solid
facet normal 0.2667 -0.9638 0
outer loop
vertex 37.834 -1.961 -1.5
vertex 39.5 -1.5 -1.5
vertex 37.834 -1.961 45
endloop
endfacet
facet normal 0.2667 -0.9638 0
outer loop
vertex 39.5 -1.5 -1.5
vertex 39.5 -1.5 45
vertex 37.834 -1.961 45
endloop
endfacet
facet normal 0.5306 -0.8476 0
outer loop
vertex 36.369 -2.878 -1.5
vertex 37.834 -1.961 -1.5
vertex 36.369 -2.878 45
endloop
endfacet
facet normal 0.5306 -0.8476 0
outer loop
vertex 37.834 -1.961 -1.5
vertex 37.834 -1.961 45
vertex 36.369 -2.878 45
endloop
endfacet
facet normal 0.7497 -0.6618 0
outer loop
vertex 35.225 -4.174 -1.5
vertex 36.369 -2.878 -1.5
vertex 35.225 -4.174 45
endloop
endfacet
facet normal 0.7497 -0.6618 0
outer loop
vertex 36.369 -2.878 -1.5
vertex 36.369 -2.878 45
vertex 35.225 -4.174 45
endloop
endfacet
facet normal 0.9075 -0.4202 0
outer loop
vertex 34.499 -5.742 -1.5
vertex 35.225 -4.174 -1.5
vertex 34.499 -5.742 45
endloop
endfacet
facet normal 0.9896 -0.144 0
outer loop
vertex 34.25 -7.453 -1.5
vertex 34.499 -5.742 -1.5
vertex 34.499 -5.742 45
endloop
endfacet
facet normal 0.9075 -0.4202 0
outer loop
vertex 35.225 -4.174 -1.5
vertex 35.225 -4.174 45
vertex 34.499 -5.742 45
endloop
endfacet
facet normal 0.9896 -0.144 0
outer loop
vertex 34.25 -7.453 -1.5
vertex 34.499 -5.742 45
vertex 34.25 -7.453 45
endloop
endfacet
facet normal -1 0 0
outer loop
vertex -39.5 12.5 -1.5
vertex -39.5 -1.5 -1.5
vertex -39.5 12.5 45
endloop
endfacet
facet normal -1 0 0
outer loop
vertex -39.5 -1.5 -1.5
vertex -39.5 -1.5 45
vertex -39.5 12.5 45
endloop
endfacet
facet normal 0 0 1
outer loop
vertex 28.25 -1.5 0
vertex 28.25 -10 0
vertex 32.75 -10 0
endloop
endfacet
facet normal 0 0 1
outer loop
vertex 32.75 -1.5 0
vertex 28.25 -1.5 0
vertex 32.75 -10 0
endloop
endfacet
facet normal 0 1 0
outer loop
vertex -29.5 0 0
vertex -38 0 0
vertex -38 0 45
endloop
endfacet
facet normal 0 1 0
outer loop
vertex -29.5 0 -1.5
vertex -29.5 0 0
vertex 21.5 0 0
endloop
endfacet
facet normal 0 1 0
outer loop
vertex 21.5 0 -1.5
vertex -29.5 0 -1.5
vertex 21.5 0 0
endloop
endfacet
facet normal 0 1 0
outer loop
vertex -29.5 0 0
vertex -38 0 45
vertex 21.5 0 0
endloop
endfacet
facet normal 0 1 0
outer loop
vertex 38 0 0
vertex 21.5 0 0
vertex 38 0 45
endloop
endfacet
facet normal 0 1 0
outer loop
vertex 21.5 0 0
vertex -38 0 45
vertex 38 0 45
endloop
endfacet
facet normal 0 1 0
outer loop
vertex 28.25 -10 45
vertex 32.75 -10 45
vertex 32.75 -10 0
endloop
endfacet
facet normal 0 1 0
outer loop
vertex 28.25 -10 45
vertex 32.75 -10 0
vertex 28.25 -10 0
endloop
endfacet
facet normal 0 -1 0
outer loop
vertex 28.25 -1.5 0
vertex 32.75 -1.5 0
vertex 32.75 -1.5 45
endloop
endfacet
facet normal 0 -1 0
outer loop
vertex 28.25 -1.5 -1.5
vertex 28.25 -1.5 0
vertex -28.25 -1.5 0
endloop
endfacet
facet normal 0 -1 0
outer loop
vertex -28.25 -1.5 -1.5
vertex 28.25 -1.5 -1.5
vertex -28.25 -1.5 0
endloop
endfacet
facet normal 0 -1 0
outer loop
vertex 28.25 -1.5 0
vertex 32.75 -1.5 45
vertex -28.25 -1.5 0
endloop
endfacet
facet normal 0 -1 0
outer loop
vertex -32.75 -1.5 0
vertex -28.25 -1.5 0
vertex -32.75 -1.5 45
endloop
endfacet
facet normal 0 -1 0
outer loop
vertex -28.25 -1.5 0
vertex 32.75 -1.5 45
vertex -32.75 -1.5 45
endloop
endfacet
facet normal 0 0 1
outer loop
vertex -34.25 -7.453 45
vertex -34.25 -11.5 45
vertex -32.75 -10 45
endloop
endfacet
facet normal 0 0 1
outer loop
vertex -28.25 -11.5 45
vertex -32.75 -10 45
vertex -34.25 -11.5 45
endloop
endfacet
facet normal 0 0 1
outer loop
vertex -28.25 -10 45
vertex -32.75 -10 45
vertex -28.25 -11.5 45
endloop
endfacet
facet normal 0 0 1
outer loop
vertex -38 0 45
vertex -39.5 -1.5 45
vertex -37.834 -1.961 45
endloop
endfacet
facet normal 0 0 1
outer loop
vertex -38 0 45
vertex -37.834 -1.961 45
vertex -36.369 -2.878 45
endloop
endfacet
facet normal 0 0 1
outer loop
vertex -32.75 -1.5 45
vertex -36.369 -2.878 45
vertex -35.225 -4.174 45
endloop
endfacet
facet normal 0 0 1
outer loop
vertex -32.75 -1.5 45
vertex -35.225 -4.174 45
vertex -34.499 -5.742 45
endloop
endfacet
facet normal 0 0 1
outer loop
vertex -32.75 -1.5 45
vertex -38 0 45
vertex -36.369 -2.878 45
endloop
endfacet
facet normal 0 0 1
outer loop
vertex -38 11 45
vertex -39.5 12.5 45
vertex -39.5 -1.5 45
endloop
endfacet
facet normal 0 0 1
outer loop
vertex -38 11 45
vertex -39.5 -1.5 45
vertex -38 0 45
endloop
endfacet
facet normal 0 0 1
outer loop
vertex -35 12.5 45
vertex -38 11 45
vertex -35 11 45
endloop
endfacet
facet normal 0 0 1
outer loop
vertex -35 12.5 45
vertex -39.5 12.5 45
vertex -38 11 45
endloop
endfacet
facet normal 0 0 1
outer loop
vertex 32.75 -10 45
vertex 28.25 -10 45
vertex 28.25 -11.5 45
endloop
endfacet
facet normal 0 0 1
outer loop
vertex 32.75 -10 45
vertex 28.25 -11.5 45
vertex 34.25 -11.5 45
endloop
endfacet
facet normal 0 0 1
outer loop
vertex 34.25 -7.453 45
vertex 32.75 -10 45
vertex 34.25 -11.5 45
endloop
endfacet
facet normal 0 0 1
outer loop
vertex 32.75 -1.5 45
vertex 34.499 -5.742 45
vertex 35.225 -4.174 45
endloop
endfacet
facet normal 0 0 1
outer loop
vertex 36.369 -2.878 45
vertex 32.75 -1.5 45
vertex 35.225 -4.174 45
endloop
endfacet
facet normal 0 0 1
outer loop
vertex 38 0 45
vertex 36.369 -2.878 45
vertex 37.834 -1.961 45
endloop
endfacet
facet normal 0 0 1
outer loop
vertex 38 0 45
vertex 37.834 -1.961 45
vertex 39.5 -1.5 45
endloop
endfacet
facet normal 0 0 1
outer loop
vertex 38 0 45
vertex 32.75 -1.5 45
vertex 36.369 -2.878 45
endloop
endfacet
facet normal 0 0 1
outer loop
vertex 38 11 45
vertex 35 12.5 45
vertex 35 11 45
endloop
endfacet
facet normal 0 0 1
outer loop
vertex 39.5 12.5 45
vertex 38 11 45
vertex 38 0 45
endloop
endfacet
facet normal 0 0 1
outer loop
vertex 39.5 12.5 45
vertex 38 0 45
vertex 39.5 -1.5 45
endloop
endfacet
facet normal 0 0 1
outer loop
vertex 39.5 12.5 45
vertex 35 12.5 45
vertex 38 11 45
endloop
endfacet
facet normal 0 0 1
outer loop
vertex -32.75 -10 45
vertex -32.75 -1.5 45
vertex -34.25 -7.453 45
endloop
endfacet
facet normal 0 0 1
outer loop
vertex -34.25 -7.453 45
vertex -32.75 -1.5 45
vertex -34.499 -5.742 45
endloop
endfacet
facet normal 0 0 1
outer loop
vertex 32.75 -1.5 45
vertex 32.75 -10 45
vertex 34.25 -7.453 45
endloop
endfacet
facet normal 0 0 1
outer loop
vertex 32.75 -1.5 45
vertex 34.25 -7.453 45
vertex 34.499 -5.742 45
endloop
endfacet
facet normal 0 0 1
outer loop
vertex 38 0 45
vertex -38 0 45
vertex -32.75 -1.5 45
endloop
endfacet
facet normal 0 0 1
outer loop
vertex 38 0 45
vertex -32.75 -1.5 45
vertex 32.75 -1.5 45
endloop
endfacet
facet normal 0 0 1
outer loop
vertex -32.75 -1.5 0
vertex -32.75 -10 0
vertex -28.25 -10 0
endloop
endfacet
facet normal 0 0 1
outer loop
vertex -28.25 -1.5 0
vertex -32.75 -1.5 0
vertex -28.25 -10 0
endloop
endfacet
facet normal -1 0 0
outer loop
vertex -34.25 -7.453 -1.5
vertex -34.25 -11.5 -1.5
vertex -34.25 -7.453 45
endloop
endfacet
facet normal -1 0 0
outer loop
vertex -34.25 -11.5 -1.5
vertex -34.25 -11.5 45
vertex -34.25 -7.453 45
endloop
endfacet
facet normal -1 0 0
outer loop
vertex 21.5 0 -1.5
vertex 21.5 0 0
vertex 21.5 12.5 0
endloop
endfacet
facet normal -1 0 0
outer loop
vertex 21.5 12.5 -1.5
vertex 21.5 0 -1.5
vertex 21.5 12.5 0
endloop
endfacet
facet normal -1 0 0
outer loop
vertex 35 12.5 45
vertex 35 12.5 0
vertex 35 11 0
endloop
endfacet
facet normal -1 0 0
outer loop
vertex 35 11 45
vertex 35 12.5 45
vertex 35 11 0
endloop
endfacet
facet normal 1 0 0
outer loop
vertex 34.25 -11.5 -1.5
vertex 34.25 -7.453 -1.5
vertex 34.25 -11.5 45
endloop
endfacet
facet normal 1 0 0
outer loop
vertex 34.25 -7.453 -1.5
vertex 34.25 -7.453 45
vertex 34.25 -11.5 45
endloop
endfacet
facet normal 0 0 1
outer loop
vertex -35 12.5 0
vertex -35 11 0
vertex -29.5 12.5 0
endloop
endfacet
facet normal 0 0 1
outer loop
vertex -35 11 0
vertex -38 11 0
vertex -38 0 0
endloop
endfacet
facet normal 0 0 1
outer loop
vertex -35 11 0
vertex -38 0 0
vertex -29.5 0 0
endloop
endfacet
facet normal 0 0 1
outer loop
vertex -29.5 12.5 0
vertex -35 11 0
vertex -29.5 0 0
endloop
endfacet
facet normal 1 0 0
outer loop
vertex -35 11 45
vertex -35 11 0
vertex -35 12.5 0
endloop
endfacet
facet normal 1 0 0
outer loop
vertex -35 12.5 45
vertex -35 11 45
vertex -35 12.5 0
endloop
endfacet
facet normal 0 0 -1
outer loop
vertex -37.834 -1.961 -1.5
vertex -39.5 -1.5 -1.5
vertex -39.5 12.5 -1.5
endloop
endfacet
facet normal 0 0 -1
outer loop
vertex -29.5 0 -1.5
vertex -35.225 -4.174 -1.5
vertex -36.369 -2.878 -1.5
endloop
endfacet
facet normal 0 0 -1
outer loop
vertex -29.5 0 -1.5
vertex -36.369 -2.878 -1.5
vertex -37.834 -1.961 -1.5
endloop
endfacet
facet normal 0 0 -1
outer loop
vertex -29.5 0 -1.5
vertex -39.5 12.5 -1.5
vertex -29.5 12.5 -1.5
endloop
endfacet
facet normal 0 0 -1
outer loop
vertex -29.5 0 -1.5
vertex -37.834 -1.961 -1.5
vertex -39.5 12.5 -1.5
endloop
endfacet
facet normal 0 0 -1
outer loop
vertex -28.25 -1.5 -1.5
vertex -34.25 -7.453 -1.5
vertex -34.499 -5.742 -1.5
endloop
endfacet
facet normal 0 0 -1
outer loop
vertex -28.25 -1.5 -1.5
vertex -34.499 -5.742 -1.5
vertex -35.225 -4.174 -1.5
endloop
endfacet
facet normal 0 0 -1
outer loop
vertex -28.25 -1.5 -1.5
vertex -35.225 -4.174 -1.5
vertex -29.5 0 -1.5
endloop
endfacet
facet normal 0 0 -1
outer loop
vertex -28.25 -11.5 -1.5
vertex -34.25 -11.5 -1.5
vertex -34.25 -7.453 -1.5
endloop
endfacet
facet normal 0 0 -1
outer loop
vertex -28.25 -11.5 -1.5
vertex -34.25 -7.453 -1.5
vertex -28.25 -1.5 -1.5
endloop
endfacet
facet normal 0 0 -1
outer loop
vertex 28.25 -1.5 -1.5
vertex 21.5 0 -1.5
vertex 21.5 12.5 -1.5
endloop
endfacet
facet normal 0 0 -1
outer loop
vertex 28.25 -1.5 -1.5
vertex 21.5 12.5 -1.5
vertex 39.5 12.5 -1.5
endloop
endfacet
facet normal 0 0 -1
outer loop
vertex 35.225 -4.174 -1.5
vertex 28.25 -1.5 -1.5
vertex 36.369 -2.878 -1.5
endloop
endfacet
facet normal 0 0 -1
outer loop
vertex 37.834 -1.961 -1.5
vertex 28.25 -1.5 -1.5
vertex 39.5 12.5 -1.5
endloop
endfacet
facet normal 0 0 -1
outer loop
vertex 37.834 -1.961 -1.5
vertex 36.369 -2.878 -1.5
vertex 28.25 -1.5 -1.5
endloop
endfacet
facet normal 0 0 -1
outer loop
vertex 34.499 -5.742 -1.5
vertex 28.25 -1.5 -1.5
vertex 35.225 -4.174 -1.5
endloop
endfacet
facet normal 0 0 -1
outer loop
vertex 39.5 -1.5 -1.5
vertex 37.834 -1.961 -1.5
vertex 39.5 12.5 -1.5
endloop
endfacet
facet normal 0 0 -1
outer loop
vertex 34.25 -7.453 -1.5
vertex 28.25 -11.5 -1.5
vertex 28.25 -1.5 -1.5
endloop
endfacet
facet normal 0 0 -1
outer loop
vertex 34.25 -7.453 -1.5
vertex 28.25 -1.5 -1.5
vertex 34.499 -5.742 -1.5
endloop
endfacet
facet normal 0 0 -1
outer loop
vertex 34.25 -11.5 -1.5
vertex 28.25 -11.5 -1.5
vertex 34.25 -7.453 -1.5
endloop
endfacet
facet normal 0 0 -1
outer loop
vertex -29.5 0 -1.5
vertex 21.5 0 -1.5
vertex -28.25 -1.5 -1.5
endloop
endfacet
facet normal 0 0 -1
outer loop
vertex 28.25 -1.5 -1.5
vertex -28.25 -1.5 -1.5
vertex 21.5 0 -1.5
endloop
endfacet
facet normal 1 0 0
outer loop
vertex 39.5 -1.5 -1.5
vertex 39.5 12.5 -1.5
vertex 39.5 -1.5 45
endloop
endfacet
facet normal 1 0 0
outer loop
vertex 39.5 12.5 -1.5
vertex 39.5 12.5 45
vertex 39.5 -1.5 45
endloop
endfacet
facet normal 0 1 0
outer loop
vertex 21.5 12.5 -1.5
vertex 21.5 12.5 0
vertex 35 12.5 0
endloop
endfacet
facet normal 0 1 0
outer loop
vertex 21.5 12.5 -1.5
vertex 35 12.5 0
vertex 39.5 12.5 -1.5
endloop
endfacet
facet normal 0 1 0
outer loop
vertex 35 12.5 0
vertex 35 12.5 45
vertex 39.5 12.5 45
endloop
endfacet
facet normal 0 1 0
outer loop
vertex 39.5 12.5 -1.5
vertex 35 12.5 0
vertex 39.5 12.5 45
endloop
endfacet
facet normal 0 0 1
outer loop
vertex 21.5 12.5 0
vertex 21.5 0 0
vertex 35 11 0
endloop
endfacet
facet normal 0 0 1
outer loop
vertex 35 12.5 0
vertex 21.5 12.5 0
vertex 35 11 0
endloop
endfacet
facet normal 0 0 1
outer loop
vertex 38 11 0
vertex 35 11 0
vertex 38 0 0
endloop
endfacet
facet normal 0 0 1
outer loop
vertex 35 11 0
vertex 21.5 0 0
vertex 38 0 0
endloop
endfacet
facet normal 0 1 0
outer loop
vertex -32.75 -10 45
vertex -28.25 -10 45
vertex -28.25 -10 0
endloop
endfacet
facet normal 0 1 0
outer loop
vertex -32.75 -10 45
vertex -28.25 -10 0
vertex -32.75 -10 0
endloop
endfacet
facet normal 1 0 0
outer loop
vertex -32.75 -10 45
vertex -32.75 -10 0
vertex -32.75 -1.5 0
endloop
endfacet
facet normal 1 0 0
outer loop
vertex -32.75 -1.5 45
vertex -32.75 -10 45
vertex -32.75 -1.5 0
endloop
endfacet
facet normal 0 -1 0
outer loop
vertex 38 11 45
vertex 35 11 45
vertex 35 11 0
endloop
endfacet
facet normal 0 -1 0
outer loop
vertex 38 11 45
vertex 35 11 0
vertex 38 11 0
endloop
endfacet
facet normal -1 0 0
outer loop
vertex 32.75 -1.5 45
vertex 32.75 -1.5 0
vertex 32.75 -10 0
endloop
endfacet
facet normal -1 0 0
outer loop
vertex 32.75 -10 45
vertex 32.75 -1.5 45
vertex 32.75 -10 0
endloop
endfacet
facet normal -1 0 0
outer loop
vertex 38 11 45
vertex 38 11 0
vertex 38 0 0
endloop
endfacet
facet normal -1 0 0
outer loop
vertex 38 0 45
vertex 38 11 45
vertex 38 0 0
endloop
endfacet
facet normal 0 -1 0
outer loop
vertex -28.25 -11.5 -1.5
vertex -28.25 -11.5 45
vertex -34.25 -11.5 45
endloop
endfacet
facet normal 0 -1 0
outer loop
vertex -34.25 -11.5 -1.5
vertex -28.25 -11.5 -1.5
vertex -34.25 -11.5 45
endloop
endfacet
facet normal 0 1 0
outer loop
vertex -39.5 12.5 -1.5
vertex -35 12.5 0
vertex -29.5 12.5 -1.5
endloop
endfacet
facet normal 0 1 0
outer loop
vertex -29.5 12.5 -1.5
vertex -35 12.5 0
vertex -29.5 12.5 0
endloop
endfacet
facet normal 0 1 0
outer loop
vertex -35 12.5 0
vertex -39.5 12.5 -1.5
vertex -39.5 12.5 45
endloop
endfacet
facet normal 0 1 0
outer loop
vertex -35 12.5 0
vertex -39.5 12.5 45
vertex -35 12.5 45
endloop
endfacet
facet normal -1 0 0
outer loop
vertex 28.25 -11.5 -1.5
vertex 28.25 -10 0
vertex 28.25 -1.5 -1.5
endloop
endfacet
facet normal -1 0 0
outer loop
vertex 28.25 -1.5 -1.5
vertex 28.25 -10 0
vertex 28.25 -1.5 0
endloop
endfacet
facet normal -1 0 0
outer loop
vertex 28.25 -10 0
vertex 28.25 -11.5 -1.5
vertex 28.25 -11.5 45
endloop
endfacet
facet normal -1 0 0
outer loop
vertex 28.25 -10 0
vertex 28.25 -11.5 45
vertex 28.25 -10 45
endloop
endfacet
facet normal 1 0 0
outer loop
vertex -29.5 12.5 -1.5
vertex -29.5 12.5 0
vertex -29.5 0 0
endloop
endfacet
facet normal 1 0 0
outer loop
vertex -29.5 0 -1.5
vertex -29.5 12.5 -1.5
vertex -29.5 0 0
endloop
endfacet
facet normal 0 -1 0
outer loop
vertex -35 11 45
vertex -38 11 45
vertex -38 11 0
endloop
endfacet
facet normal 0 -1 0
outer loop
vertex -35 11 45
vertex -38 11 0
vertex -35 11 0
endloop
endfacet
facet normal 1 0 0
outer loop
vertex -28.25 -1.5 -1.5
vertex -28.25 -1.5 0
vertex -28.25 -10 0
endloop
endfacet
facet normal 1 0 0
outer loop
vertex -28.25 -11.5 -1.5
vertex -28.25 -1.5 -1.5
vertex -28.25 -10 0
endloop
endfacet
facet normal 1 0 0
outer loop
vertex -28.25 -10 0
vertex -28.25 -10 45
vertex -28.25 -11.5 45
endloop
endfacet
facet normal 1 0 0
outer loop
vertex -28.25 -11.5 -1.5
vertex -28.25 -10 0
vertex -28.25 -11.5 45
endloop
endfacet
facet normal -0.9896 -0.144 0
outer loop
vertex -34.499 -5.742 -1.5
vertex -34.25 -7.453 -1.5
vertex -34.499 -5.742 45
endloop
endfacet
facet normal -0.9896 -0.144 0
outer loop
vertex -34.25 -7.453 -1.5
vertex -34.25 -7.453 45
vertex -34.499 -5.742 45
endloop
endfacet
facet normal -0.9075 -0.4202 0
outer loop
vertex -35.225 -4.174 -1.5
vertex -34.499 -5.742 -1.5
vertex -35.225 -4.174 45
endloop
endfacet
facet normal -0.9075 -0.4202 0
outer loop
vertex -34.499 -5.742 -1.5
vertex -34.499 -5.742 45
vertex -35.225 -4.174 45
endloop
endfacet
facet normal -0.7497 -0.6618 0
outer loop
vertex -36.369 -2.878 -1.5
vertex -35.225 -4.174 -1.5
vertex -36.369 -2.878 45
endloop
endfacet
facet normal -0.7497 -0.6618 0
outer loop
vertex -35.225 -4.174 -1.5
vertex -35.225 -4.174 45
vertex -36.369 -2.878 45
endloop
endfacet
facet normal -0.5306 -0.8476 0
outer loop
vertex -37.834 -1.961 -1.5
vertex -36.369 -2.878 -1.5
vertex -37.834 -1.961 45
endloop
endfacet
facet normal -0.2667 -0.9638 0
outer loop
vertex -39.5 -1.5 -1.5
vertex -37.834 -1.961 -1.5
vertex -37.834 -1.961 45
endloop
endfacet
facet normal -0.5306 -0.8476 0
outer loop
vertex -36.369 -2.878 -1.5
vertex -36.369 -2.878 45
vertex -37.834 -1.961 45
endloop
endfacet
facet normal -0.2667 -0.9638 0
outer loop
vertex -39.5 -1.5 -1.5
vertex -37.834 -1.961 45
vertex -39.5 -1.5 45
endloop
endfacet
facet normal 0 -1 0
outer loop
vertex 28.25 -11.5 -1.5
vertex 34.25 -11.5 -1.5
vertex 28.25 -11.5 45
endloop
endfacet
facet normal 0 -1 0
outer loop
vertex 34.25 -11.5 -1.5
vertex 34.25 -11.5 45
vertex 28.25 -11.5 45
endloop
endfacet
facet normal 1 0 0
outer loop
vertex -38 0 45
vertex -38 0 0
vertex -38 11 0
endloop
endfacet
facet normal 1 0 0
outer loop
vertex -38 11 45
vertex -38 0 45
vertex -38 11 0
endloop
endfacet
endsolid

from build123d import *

# Parameters (mm, degrees)
F1_DEPTH    = 45
F2_T1_DEPTH = 45
F3_W        = 4.5
F3_H        = 8.5
F4_DEPTH    = 1.5


# Not quite as in the source:
# - a fillet or chamfer that OpenCascade refuses, or shapes differently, is made with other operations: its cross-section is extruded or revolved along the edge and cut away or added


with BuildPart() as f1:
    # F0 (on Top) → F1 (new body)
    with BuildSketch(Plane.XY):
        Polygon((38, 0), (0, 0), (-38, 0), (-38, 11), (-35, 11), (-35, 12.5), (-39.5, 12.5), (-39.5, -1.5), (-34.25, -1.5), (-32.75, -1.5), (0, -1.5), (32.75, -1.5), (34.25, -1.5), (39.5, -1.5), (39.5, 12.5), (35, 12.5), (35, 11), (38, 11), align=None)
        Polygon((-32.75, -1.5), (-34.25, -1.5), (-34.25, -11.5), (-28.25, -11.5), (-28.25, -10), (-32.75, -10), align=None)
        Polygon((34.25, -11.5), (34.25, -1.5), (32.75, -1.5), (32.75, -10), (28.25, -10), (28.25, -11.5), align=None)
    extrude(amount=F1_DEPTH)

    # F2: fillet of radius 6 on 2 edges, made by hand

    # F2_s2 → F2_t1 (join)
    with BuildSketch(Plane.XY):
        with BuildLine():
            ThreePointArc((-39.5, -1.5), (-35.75, -3.4843134833), (-34.25, -7.4529404499))
            Line((-34.25, -7.4529404499), (-34.25, -1.5))
            Line((-34.25, -1.5), (-39.5, -1.5))
        make_face()
        with BuildLine():
            ThreePointArc((34.25, -7.4529404499), (35.75, -3.4843134833), (39.5, -1.5))
            Line((39.5, -1.5), (34.25, -1.5))
            Line((34.25, -1.5), (34.25, -7.4529404499))
        make_face()
    extrude(amount=F2_T1_DEPTH)

    # F3 (on face) → F4 (join)
    with BuildSketch(Plane(origin=(0, 0, 0), x_dir=(1, 0, 0), z_dir=(0, 0, -1))):
        with BuildLine():
            Line((-32.75, 10), (-28.25, 10))
            Line((-28.25, 10), (-28.25, 11.5))
            Line((-28.25, 11.5), (-34.25, 11.5))
            Line((-34.25, 11.5), (-34.25, 7.4529404499))
            ThreePointArc((-34.25, 7.4529404499), (-35.75, 3.4843134833), (-39.5, 1.5))
            Line((-39.5, 1.5), (-39.5, -12.5))
            Line((-39.5, -12.5), (-35, -12.5))
            Line((-35, -12.5), (-35, -11))
            Line((-35, -11), (-38, -11))
            Line((-38, -11), (-38, 0))
            Line((-38, 0), (-29.5, 0))
            Line((-29.5, 0), (21.5, 0))
            Line((21.5, 0), (38, 0))
            Line((38, 0), (38, -11))
            Line((38, -11), (35, -11))
            Line((35, -11), (35, -12.5))
            Line((35, -12.5), (39.5, -12.5))
            Line((39.5, -12.5), (39.5, 1.5))
            ThreePointArc((39.5, 1.5), (35.75, 3.4843134833), (34.25, 7.4529404499))
            Line((34.25, 7.4529404499), (34.25, 11.5))
            Line((34.25, 11.5), (28.25, 11.5))
            Line((28.25, 11.5), (28.25, 10))
            Line((28.25, 10), (32.75, 10))
            Line((32.75, 10), (32.75, 1.5))
            Line((32.75, 1.5), (28.25, 1.5))
            Line((28.25, 1.5), (-28.25, 1.5))
            Line((-28.25, 1.5), (-32.75, 1.5))
            Line((-32.75, 1.5), (-32.75, 10))
        make_face()
        with Locations((-30.5, 5.75)):
            Rectangle(F3_W, F3_H)
        Polygon((-35, -11), (-35, -12.5), (-29.5, -12.5), (-29.5, 0), (-38, 0), (-38, -11), align=None)
        with Locations((30.5, 5.75)):
            Rectangle(F3_W, F3_H)
        Polygon((21.5, -12.5), (35, -12.5), (35, -11), (38, -11), (38, 0), (21.5, 0), align=None)
    extrude(amount=F4_DEPTH)


solid = f1.part
